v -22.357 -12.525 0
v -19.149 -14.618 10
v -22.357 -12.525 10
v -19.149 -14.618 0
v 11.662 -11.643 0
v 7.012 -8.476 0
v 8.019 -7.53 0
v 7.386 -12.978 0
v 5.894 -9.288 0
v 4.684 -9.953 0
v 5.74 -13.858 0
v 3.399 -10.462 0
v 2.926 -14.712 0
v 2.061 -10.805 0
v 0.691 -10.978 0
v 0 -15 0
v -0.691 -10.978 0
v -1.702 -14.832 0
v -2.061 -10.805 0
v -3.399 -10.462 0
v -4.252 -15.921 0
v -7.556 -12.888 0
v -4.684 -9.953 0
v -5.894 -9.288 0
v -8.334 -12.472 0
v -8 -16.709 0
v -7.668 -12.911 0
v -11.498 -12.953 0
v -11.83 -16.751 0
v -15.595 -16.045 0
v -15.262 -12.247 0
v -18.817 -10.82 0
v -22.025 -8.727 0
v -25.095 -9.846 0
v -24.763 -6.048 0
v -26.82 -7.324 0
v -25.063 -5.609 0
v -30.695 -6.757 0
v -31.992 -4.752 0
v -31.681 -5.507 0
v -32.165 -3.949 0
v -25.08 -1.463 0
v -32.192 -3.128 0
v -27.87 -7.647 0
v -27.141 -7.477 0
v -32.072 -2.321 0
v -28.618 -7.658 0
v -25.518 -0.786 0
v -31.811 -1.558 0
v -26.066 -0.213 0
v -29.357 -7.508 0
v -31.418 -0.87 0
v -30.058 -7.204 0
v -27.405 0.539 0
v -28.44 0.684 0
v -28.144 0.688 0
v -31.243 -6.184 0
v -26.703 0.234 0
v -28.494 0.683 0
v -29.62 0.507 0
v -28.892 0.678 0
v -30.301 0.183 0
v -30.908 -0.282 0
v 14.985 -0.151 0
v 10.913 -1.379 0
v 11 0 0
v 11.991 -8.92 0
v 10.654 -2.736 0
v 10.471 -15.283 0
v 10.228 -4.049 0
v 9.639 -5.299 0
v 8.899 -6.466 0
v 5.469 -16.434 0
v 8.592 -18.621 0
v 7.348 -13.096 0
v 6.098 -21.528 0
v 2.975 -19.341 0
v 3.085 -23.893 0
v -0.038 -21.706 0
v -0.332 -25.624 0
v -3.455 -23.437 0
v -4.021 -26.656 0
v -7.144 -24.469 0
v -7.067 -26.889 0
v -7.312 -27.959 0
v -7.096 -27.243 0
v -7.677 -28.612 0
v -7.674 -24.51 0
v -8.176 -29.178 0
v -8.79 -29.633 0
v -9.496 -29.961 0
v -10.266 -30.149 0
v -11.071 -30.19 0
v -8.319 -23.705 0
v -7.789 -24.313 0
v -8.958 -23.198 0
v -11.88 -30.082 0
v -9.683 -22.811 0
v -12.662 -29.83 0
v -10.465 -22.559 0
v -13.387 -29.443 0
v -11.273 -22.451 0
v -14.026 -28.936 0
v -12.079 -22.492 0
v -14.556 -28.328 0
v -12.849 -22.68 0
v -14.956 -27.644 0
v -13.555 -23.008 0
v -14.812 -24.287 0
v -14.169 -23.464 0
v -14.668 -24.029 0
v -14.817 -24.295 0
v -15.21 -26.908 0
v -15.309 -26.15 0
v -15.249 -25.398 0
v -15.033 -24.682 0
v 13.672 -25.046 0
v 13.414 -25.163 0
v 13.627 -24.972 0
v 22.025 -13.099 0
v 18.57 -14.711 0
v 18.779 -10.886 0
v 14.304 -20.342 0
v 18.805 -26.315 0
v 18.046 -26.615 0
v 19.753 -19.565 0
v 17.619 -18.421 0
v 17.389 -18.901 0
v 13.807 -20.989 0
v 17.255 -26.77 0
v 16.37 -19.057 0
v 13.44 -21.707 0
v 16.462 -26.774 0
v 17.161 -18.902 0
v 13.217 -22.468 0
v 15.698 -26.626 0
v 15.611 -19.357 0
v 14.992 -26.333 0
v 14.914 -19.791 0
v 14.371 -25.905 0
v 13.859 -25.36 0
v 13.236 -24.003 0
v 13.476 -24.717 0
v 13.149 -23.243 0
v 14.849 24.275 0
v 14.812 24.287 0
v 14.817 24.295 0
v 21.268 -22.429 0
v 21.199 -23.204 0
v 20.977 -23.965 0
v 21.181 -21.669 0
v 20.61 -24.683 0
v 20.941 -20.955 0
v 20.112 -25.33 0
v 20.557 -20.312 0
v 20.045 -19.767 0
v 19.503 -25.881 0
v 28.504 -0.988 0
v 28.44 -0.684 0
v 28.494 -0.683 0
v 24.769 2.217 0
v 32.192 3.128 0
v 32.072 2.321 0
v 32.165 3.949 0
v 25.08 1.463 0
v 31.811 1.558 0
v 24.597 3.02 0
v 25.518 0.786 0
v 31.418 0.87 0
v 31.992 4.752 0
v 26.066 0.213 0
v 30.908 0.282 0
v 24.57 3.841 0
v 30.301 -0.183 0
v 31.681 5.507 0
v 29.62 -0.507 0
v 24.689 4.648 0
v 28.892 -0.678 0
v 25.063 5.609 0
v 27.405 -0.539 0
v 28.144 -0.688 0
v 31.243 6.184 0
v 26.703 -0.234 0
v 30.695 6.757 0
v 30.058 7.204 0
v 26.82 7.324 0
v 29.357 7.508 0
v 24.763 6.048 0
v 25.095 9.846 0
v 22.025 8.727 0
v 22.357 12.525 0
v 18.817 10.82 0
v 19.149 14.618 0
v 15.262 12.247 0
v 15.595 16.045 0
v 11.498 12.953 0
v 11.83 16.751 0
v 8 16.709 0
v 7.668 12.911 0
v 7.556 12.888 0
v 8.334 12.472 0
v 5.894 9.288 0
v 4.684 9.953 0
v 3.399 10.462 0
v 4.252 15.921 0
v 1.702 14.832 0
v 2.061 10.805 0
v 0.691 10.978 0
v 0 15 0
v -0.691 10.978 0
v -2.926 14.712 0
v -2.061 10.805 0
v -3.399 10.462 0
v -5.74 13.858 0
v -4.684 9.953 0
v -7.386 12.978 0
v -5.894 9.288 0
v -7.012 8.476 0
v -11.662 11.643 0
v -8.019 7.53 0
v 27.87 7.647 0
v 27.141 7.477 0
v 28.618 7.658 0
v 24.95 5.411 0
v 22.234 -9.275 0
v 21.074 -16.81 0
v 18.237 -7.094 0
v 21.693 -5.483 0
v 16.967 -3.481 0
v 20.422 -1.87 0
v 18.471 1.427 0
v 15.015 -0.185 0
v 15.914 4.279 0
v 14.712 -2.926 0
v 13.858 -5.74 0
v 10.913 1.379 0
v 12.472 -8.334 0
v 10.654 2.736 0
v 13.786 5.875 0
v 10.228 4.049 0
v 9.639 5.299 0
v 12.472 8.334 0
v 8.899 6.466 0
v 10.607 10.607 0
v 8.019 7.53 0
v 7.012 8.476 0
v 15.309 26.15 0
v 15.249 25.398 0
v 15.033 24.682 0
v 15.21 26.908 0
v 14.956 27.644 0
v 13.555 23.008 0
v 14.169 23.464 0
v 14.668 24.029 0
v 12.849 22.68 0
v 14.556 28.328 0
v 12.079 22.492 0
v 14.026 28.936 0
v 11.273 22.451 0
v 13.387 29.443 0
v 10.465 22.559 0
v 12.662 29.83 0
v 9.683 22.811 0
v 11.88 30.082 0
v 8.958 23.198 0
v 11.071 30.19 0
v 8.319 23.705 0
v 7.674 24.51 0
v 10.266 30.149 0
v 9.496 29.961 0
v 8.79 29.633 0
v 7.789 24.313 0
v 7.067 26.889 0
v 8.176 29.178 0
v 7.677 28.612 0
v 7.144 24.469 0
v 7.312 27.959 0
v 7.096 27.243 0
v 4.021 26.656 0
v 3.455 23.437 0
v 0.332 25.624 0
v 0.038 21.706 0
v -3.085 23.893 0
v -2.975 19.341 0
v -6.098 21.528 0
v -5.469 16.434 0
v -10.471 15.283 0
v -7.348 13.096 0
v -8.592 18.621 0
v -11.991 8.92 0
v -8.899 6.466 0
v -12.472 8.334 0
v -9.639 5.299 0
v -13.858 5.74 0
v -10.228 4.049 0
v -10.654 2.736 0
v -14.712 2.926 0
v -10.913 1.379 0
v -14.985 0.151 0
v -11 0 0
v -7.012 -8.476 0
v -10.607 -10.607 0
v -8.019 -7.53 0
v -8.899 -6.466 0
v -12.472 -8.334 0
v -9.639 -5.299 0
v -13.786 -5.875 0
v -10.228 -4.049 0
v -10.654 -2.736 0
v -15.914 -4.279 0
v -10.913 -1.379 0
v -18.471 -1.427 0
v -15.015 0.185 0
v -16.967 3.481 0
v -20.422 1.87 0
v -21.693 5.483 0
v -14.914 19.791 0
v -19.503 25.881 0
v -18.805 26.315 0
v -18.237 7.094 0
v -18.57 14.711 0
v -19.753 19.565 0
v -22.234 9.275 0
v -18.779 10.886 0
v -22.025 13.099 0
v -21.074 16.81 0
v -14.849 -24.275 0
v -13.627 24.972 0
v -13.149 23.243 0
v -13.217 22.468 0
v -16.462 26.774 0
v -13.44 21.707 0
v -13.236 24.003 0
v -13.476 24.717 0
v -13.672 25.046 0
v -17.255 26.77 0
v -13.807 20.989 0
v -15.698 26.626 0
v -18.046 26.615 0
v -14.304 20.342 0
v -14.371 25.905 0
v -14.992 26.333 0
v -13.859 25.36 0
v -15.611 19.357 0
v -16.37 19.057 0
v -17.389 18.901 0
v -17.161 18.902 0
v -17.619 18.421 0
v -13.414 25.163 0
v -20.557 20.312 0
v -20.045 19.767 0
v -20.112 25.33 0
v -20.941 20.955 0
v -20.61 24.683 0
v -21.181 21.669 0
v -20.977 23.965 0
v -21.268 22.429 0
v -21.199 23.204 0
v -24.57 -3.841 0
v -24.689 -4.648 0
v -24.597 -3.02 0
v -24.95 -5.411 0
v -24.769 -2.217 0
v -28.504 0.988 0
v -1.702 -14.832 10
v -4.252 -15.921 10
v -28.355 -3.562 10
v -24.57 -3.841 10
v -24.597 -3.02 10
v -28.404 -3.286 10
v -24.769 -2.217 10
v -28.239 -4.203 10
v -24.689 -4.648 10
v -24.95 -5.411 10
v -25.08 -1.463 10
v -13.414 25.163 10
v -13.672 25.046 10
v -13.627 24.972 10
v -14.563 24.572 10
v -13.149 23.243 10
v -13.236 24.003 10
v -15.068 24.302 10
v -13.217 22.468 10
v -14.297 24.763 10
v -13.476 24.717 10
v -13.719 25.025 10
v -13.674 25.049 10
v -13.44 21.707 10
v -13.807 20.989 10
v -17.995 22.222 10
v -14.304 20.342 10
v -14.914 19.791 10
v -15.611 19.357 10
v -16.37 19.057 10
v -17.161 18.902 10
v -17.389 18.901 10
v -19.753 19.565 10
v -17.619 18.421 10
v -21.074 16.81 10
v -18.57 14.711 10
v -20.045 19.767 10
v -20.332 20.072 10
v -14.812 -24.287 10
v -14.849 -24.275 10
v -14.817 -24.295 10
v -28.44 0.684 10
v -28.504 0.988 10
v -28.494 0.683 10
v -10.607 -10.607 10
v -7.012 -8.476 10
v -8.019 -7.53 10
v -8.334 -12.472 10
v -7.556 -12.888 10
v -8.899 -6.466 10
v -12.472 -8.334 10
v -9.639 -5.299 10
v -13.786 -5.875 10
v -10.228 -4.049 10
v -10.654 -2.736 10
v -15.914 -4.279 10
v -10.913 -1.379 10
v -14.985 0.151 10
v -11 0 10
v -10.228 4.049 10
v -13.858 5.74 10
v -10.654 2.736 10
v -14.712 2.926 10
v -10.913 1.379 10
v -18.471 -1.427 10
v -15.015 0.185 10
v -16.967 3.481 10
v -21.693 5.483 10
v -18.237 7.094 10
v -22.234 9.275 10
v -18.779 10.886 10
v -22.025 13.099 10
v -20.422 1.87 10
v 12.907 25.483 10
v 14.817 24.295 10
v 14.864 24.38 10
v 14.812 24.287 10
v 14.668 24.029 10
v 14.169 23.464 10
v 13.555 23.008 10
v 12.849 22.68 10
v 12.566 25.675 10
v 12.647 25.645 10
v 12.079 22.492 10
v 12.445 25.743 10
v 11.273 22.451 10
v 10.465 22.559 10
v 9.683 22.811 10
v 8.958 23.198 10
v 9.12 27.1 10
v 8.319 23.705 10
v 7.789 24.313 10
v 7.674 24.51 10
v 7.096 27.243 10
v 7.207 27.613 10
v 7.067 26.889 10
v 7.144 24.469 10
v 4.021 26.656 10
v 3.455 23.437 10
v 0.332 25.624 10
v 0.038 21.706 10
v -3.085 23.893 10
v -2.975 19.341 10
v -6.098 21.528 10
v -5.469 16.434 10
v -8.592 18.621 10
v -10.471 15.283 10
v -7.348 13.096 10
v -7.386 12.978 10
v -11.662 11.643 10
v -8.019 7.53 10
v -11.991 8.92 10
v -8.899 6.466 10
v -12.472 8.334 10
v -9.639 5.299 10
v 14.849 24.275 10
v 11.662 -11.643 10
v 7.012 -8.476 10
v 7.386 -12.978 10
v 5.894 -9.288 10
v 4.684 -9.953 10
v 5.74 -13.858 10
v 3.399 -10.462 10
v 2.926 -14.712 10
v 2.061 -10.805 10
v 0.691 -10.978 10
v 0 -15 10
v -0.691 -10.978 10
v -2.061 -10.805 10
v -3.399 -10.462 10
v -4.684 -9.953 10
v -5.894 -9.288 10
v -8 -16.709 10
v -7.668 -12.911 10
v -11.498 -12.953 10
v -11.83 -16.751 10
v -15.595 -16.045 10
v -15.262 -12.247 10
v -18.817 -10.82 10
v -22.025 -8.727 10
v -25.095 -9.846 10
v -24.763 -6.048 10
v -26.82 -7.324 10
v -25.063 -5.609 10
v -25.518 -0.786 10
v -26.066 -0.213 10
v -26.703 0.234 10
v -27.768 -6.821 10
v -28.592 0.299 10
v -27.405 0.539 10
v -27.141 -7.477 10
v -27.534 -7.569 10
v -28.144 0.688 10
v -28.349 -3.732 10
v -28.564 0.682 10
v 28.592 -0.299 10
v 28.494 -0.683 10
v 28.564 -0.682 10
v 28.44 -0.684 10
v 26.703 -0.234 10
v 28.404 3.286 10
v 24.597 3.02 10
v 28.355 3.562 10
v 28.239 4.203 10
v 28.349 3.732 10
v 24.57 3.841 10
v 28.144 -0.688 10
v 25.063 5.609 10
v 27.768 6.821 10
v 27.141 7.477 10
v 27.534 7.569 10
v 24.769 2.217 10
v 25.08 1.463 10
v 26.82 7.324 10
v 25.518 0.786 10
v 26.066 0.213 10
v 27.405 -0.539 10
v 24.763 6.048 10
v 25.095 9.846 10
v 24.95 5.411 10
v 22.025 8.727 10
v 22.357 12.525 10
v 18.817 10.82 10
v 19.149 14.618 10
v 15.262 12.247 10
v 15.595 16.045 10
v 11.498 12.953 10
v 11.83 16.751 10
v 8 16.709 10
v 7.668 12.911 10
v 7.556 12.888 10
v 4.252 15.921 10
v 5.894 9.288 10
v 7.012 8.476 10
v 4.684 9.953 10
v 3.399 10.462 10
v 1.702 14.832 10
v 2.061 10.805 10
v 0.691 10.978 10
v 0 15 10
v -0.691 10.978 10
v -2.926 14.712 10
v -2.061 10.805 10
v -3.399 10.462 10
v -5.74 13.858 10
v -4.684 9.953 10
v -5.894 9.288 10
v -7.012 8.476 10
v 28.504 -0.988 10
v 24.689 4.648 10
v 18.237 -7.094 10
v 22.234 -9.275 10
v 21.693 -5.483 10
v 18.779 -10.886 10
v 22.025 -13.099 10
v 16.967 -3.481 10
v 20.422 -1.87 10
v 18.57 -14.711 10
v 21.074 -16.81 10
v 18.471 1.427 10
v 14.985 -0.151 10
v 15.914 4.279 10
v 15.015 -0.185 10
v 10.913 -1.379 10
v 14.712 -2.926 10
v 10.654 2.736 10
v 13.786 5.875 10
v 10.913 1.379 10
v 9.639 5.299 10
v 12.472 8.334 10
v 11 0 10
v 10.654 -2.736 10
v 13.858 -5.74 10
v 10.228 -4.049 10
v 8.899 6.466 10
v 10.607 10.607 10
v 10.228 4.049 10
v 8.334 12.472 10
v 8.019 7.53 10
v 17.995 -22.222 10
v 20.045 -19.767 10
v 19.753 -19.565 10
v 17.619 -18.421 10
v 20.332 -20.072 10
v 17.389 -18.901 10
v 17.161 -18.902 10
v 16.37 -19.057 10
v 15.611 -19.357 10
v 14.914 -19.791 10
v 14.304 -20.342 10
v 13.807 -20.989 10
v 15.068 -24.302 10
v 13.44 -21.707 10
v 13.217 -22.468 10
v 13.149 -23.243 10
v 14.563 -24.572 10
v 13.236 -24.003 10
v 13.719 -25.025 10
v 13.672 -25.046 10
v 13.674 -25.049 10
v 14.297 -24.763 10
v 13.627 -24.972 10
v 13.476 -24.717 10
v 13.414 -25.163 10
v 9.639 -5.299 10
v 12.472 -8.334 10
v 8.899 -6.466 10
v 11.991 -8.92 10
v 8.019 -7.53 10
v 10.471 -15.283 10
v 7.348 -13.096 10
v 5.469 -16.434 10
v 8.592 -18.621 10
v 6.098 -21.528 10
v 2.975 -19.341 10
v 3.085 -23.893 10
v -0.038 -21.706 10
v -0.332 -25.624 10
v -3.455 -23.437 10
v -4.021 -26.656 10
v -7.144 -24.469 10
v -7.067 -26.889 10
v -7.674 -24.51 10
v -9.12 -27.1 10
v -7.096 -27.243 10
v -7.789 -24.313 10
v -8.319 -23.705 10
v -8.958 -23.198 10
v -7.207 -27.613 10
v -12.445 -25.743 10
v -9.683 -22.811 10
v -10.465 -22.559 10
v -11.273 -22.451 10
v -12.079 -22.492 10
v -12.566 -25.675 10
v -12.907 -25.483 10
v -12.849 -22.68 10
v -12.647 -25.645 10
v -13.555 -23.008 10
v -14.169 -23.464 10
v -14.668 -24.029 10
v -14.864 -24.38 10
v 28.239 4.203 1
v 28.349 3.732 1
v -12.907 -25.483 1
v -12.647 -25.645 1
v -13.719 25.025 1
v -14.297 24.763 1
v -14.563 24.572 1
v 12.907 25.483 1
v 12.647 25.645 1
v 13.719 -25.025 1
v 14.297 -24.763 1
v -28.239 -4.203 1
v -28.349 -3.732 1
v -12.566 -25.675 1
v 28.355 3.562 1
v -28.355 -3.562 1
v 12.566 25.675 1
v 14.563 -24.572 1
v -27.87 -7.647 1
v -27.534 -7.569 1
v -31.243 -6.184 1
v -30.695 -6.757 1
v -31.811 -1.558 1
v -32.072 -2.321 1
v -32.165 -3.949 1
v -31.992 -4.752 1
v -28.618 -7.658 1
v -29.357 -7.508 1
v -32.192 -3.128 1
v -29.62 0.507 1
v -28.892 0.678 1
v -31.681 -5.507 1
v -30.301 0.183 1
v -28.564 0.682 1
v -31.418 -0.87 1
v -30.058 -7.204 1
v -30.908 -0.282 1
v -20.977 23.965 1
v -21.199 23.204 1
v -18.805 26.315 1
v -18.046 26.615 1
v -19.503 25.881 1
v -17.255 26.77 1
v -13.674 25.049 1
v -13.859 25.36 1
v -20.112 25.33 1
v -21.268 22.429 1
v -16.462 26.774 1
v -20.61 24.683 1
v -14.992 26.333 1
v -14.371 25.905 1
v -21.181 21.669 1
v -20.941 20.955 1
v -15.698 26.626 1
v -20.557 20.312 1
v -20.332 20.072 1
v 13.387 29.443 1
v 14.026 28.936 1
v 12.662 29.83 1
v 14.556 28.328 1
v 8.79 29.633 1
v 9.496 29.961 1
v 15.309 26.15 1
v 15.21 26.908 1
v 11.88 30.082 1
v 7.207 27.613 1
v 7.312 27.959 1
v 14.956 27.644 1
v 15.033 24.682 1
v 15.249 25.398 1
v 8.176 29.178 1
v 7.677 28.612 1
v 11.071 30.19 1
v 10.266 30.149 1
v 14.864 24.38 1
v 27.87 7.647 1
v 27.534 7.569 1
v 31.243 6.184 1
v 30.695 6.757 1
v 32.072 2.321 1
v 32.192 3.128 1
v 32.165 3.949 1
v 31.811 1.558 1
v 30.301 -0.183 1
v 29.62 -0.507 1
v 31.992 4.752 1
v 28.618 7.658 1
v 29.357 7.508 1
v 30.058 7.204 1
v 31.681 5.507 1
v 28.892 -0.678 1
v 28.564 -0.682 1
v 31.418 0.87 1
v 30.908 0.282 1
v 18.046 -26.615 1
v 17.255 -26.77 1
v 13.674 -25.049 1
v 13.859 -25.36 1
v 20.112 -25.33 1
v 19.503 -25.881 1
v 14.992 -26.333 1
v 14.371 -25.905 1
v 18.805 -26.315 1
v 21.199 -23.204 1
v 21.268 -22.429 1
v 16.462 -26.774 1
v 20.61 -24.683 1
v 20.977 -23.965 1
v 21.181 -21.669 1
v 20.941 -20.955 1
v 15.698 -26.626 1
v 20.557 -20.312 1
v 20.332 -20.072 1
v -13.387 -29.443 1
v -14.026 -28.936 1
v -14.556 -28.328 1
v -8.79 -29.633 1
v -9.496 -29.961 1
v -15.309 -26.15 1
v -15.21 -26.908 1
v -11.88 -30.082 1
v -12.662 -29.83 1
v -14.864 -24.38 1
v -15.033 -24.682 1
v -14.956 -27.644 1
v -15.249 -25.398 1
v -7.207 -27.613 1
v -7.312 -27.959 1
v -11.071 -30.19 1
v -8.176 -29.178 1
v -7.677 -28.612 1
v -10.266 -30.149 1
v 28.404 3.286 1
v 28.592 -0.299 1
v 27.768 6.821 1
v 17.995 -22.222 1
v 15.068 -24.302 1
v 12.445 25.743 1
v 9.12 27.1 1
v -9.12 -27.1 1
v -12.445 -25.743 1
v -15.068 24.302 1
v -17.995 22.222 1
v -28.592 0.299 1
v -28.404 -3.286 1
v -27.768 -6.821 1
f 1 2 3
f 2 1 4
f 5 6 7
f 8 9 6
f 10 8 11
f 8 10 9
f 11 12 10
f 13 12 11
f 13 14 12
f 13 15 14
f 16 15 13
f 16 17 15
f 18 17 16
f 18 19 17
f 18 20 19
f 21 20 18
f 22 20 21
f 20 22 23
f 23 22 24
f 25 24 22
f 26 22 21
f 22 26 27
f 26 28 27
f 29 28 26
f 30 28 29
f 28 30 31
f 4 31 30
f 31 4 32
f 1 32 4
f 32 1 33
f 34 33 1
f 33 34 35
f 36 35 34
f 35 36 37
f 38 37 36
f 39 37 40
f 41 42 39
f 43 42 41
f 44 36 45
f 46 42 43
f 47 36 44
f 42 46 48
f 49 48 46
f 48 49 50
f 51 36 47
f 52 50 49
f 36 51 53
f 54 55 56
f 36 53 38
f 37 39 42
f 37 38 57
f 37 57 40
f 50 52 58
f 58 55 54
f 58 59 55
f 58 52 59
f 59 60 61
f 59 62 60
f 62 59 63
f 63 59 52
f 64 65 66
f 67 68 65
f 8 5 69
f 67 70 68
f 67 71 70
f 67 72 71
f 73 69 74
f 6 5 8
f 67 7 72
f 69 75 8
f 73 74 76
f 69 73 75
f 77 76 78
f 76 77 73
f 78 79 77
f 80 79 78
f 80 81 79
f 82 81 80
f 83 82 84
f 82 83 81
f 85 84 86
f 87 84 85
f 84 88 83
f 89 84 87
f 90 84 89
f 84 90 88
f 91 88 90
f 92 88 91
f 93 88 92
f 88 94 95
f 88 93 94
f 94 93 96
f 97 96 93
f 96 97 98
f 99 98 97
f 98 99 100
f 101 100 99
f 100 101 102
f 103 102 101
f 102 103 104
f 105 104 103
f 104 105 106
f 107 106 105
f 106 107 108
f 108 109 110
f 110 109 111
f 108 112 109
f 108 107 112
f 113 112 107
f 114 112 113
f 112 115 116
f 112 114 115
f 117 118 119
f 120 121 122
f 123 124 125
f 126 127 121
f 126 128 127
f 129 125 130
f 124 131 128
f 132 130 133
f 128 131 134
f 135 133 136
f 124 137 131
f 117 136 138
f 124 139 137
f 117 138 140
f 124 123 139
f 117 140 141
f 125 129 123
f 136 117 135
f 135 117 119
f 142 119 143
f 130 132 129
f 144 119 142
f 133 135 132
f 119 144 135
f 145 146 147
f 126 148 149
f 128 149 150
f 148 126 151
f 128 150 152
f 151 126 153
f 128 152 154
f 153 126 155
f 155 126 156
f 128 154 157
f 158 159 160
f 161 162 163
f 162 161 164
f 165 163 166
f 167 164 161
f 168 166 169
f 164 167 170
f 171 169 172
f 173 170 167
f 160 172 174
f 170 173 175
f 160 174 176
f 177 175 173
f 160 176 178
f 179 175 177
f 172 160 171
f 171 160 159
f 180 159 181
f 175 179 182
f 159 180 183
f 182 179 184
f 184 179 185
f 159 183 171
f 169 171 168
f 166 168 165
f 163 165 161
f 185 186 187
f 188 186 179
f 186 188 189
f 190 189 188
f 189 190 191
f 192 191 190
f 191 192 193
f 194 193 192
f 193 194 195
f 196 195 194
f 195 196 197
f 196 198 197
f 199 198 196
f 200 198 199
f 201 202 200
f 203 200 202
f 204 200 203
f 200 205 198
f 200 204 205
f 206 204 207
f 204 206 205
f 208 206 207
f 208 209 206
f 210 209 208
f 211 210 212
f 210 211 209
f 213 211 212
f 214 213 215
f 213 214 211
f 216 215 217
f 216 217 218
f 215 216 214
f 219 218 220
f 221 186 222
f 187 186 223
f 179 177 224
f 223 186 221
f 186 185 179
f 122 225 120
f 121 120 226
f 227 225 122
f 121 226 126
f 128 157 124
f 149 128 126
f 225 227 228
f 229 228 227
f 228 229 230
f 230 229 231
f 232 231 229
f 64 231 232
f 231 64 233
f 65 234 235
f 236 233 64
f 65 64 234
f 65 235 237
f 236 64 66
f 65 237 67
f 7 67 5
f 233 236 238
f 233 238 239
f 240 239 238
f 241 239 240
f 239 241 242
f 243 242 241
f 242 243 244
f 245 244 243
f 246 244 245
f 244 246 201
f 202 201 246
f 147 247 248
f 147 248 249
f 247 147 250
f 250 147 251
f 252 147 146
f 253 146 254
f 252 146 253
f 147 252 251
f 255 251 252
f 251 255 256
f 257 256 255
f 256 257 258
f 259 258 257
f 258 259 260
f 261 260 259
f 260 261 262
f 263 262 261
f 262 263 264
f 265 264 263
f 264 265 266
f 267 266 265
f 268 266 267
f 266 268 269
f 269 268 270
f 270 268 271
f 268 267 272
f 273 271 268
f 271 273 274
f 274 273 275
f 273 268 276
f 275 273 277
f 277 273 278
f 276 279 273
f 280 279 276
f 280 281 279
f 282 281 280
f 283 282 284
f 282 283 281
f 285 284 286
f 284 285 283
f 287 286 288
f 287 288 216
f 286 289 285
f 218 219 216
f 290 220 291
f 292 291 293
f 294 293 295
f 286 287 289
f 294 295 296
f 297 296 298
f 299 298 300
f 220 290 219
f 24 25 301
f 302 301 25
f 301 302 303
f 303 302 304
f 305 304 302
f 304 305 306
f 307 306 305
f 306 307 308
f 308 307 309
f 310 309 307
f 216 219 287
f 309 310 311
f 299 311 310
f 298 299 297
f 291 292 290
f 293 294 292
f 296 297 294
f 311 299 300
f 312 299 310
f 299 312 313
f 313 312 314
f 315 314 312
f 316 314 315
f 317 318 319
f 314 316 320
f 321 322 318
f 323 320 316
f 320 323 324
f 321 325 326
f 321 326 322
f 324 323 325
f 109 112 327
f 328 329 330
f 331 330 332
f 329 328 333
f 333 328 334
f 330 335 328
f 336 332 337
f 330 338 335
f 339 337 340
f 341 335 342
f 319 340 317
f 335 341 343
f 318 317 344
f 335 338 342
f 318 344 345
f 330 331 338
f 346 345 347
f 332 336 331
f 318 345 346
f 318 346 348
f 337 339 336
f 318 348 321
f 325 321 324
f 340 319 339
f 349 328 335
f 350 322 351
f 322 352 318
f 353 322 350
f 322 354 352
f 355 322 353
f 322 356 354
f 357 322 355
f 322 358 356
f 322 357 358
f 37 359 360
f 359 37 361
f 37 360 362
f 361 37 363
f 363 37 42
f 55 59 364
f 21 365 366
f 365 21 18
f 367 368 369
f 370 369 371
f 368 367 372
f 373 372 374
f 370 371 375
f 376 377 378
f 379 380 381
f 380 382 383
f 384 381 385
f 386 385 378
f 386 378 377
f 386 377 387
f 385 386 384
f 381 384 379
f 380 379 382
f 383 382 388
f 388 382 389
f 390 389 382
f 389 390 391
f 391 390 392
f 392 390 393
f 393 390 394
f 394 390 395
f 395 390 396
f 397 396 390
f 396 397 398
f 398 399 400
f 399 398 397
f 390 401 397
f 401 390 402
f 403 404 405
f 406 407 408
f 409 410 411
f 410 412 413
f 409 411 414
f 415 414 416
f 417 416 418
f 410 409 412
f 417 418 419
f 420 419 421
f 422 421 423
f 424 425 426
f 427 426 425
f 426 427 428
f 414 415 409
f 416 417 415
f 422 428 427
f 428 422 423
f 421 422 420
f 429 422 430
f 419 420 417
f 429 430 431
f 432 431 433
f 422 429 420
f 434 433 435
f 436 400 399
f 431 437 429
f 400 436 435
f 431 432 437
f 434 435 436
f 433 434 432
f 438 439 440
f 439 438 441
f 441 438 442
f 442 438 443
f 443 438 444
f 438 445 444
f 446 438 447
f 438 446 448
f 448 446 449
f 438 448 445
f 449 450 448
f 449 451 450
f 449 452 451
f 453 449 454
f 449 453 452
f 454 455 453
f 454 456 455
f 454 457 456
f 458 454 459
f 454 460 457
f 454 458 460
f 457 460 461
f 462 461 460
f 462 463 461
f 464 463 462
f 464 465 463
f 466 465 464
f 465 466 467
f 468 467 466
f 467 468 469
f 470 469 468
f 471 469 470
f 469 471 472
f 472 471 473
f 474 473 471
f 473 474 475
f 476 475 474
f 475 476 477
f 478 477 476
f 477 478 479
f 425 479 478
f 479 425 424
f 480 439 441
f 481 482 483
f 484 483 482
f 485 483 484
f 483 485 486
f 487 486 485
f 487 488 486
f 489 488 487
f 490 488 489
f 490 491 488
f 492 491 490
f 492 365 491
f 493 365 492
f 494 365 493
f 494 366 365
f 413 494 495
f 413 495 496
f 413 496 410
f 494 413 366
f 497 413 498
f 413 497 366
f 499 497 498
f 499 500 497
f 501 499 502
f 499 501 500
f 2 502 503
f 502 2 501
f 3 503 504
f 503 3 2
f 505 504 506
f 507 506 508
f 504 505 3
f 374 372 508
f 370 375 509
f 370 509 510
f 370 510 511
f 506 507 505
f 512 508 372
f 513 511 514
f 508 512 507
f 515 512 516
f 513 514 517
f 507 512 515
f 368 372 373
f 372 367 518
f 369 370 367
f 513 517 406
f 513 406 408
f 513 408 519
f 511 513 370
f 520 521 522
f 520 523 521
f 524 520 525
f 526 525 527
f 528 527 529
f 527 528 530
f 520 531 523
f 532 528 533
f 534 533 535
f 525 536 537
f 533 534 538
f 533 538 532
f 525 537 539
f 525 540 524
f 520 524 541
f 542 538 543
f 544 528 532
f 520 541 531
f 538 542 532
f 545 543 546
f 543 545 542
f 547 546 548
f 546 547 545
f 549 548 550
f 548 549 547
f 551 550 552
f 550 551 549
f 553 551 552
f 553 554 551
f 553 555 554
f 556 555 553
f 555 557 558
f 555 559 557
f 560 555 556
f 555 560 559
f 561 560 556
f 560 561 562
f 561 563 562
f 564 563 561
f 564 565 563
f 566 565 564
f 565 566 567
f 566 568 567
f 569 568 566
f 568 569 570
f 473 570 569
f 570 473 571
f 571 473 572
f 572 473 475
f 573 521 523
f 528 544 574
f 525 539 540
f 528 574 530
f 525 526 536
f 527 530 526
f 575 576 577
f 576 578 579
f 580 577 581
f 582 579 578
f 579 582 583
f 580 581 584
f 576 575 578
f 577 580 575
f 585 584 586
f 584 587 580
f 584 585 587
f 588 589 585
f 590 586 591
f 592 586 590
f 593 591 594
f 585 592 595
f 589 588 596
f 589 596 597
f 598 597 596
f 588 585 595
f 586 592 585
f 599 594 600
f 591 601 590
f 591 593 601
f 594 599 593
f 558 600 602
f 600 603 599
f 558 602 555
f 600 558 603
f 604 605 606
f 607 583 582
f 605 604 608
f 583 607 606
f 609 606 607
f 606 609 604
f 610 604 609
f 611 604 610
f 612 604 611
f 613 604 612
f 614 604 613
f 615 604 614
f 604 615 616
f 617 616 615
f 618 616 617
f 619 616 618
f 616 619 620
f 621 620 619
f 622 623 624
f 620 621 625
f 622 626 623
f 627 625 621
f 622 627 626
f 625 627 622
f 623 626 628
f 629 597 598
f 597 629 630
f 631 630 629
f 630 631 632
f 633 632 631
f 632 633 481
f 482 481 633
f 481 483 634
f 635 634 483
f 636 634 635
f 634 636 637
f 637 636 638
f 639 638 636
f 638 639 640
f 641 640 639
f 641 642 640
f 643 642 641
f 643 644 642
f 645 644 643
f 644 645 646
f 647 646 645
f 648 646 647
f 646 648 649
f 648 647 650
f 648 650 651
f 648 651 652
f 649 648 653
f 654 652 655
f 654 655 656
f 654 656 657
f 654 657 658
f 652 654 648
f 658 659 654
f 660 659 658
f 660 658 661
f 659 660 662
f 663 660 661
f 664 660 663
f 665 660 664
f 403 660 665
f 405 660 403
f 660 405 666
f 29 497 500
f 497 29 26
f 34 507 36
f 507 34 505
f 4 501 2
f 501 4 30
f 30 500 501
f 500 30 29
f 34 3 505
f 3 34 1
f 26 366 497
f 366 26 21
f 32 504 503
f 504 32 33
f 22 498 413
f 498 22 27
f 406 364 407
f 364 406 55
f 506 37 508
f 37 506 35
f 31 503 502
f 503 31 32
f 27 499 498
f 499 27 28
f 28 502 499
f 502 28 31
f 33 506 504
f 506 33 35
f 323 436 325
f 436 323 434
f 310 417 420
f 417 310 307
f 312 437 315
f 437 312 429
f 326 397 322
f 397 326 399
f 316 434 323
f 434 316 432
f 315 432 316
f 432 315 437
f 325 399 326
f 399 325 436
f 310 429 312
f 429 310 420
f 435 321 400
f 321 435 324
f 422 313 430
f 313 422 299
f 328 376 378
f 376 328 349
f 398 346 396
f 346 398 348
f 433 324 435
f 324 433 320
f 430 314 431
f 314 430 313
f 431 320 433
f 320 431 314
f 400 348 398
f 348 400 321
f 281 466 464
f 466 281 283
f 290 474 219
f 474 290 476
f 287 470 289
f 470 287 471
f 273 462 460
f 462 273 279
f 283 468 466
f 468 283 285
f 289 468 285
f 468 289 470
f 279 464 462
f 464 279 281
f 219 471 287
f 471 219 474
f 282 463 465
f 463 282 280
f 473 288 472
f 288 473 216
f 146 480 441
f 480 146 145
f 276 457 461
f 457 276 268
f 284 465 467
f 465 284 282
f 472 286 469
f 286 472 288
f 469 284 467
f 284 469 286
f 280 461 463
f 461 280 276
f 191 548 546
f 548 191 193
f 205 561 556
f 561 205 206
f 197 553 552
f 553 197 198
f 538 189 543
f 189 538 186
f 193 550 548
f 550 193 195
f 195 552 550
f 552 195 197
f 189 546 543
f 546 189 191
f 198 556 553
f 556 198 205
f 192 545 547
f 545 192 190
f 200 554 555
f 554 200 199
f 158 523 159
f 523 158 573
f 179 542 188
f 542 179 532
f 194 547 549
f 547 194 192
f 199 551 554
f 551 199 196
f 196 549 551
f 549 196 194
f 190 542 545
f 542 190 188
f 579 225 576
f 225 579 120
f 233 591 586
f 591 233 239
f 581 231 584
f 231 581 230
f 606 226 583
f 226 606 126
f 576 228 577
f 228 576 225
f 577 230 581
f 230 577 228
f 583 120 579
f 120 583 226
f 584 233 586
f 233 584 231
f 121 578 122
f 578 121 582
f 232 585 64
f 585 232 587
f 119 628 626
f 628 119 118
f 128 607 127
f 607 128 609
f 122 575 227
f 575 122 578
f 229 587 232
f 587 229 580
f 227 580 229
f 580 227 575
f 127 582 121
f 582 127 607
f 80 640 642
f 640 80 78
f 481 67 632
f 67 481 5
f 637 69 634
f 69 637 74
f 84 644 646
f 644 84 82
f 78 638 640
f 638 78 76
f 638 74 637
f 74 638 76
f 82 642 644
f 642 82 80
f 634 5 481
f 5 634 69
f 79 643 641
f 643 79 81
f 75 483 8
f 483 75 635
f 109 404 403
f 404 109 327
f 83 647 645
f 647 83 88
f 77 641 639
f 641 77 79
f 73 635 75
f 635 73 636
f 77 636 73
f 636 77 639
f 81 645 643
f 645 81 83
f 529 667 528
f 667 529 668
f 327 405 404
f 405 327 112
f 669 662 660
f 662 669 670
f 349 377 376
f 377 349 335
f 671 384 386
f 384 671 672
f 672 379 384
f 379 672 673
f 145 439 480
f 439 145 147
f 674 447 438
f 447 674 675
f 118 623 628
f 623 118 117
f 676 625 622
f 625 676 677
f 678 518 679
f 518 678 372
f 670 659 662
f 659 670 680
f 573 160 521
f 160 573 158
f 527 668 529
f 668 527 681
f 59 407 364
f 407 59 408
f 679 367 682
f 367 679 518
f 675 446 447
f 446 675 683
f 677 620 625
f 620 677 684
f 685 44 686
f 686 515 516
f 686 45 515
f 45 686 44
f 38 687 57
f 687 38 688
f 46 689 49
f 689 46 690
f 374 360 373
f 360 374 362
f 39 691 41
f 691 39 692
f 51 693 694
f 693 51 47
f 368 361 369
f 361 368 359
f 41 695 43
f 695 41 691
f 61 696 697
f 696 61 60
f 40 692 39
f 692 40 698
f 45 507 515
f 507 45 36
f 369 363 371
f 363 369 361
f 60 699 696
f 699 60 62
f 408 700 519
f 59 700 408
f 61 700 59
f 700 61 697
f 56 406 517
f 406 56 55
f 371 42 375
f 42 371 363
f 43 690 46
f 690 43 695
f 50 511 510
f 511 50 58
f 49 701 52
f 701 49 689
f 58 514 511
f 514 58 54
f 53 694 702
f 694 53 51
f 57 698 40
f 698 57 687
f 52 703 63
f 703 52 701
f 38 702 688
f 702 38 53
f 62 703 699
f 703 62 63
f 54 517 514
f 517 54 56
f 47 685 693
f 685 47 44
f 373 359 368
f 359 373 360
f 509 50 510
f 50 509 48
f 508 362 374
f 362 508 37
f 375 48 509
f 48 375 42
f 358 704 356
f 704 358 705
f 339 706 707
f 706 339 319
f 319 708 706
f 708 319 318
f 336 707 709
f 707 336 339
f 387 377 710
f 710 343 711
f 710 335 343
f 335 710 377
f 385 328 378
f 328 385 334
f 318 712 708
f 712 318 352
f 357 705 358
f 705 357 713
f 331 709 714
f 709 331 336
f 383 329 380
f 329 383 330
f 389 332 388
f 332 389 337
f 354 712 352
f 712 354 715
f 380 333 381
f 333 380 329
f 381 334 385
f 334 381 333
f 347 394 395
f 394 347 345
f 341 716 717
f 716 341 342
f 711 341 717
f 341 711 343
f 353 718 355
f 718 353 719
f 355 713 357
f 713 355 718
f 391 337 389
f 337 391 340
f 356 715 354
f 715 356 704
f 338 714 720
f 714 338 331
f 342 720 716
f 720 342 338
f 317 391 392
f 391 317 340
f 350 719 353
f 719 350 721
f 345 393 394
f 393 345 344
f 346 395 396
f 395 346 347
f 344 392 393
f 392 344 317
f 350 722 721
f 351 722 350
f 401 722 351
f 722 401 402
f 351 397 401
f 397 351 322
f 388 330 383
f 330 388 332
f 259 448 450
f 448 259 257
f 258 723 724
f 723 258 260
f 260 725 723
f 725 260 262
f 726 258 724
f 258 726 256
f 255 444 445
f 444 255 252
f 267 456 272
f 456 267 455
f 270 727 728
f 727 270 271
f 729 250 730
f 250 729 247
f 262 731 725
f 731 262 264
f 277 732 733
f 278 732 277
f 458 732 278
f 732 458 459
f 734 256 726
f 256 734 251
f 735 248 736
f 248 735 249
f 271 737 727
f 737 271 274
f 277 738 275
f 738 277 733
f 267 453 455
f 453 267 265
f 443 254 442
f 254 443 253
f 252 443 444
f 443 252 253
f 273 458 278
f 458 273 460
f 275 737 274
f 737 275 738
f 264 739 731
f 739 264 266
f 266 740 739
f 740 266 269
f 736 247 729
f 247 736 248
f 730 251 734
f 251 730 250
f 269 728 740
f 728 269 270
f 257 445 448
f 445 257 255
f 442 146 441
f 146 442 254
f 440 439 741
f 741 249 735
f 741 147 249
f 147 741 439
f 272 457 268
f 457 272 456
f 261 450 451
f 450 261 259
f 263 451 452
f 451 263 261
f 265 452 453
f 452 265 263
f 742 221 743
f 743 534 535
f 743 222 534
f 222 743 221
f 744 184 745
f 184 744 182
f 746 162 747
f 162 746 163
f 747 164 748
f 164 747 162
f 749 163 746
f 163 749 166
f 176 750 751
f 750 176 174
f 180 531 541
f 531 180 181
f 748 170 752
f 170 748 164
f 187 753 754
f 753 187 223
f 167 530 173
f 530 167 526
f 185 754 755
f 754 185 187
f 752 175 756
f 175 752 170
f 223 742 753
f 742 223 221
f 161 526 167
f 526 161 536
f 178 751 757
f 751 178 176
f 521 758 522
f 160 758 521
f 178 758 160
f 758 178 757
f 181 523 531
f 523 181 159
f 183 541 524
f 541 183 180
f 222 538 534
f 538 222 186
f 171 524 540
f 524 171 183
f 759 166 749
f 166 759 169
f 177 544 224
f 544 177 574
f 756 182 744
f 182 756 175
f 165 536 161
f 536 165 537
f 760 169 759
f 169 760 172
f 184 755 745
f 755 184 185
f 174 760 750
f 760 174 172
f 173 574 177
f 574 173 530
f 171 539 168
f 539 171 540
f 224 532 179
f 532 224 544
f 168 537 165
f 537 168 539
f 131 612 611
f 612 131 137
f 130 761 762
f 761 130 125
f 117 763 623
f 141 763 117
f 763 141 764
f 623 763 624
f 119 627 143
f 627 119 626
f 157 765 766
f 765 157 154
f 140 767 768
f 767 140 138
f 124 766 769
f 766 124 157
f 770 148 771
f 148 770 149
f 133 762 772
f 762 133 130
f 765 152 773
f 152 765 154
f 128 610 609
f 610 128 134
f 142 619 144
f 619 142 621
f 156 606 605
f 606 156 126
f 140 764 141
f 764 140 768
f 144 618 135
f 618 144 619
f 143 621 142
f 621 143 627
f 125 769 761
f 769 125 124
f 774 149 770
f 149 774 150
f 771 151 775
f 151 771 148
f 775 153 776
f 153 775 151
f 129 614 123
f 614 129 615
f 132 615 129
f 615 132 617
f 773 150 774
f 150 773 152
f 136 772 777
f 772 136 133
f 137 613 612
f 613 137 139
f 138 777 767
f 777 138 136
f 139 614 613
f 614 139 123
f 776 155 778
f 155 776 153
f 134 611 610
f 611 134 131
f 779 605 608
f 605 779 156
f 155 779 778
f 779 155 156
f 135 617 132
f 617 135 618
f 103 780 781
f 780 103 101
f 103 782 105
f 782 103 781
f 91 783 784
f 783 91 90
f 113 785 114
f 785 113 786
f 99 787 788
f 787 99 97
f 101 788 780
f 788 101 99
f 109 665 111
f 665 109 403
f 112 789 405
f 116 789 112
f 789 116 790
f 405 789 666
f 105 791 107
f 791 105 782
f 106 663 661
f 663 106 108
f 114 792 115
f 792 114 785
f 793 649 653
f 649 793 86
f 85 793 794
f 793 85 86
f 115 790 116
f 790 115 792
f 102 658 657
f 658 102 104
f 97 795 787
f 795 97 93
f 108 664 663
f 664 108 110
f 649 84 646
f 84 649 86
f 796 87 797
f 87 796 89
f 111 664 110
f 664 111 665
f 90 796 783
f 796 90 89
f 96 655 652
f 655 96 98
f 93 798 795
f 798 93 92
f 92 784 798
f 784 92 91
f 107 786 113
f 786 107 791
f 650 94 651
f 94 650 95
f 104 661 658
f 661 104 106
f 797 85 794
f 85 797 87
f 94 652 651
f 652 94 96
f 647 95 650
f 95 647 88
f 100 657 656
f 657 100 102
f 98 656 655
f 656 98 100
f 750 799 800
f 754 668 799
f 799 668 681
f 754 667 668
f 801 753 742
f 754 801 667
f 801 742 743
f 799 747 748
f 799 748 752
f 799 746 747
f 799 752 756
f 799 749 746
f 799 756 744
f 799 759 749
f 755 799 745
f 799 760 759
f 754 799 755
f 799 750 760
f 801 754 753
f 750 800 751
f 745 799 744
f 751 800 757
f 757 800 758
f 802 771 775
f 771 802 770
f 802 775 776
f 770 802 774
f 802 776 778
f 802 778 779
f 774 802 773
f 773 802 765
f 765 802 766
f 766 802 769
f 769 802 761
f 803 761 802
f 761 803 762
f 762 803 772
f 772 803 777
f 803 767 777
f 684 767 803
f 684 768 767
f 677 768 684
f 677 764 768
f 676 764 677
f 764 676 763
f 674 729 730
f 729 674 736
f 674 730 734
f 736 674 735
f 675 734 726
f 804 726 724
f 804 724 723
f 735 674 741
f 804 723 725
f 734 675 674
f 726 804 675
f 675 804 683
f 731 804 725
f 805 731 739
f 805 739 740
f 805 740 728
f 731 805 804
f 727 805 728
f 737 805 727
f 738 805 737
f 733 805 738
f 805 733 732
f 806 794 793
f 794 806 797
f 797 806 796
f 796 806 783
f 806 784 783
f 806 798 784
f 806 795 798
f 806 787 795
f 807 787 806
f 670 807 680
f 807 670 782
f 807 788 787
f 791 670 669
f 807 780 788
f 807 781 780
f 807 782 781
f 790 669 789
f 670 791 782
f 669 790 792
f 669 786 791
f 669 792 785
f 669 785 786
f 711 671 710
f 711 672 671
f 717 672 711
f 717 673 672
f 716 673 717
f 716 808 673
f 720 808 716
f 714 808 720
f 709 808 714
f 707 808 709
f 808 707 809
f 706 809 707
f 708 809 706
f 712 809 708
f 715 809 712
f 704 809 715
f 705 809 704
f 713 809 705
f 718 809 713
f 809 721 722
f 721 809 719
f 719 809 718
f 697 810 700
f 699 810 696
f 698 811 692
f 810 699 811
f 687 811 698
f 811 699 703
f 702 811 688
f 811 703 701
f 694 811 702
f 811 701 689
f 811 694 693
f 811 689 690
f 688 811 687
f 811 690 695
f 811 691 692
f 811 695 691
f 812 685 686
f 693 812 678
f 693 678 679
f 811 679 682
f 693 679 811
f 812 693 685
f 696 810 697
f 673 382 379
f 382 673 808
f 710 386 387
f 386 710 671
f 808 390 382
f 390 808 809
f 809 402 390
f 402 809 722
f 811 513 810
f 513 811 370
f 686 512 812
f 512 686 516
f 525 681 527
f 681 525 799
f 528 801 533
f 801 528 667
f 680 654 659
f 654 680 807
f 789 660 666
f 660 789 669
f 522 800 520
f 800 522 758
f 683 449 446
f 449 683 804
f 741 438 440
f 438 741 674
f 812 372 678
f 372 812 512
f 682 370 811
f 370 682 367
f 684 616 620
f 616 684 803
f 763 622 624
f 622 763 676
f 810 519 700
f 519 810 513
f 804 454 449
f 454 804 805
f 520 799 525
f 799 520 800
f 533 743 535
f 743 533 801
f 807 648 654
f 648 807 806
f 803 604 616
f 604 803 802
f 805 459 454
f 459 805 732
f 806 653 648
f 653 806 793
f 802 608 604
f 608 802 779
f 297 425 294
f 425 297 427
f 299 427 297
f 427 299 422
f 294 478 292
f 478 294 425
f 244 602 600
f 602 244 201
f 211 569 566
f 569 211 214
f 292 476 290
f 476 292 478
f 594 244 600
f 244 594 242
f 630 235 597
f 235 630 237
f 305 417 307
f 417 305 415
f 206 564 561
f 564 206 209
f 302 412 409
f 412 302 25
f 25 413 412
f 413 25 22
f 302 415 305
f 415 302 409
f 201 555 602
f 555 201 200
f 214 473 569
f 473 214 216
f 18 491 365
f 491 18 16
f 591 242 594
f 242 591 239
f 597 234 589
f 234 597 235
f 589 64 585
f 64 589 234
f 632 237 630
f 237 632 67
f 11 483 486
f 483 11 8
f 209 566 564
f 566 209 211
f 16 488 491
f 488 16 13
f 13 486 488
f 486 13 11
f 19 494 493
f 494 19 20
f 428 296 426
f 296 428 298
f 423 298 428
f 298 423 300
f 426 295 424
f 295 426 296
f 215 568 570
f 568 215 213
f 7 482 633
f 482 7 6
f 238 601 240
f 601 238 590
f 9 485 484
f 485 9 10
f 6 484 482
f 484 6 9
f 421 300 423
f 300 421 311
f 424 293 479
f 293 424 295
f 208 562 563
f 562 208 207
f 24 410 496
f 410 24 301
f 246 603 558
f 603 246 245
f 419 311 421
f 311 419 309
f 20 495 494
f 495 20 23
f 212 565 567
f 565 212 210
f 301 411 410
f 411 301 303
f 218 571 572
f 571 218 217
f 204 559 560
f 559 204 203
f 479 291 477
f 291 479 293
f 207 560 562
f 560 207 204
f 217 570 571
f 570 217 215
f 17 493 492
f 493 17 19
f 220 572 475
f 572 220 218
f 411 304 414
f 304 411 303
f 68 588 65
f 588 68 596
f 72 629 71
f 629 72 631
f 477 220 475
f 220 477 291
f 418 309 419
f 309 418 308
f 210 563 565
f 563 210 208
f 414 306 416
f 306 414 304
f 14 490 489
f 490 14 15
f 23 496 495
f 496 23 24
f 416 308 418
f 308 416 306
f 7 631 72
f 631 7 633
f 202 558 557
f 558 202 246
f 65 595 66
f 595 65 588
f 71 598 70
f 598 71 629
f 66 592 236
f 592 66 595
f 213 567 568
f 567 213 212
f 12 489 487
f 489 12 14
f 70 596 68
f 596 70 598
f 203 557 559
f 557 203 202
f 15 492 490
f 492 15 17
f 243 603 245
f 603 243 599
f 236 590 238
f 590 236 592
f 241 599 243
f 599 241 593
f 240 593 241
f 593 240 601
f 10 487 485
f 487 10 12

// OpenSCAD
// Diameter of the spool hole in mm (where the spool holder will fit)
spool_hole_diameter=57; 

// Height of the spool holder in mm
height=10; 

// Diameter of the inner hold of the spool holder in mm (where the bearing is placed)
bearing_diameter=22;

// Spool holder inner ring thickness in mm
inner_ring_thickness=4; 


number_of_arms=6;

// Arms thickness in mm
arms_thickness=4; 

// Which side do you want to print?
side=1; // [0:Left, 1:Right]


module ring(r0, r1, h=5, center=false, $fn=32) {
    difference()
    {
        cylinder(r=r1, h=h, center=center);
        translate([0, 0, -h/2]) {
            cylinder(r=r0, h=h*4, center=center);
        }
    }
}

module half_moon(r0=10, r1=10, r2=0, offset=10, h=10, center=false, $fn=32) {
    difference() {
        cylinder(r=r0, h=h, center=center);
        translate([offset,0,-h/2])
        cylinder(r=r1, h=h*4, center=center);
        translate([0,r2,-h/2])
        cylinder(r=r2, h=h*4, center=center);
    }
}

module arms(h=10, ath=3, n=6, $fn=32) {
    rotate([0,0,15]) {
        difference() {
            for (i=[0:n]) {
                rotate([0,0,360/n*i])
                translate([11,0,0]) 
                rotate([0,0,80]) {
                    half_moon(r0=20.5,r1=20.5, r2=0, h=h, offset=ath);
                }
            }
            translate([0,0,-3])
            ring(r0=30, r1=50, h=h*2);
        }
        difference() {
            for (i=[0:n]) {
                rotate([0,0,360/n*i-22 ])
                translate([30,0,0])
                scale([1,1.1,1])
                cylinder(r=4, h=h);
            }
            translate([0,0,1])
            ring(r0=30, r1=50, h=h, $fn=50);
        }
    }

}

module spool_holder(d=60,h=10, ir=11+0.2, rth=5, ath, $fn=32) {
    difference() {
        union() {
            cylinder(r=ir+rth,h=h);
            scale([(d+4)/64,(d+4)/64,1]) arms(h=h, ath=ath, n=number_of_arms);
        }
        translate([0,0,-h/2])
        cylinder(r=ir,h=h*2, $fn=50);

    }
}



mirror([side,0,0]) {
    spool_holder(d=spool_hole_diameter, h=height, ir=bearing_diameter/2, rth=inner_ring_thickness, ath=arms_thickness);
}
